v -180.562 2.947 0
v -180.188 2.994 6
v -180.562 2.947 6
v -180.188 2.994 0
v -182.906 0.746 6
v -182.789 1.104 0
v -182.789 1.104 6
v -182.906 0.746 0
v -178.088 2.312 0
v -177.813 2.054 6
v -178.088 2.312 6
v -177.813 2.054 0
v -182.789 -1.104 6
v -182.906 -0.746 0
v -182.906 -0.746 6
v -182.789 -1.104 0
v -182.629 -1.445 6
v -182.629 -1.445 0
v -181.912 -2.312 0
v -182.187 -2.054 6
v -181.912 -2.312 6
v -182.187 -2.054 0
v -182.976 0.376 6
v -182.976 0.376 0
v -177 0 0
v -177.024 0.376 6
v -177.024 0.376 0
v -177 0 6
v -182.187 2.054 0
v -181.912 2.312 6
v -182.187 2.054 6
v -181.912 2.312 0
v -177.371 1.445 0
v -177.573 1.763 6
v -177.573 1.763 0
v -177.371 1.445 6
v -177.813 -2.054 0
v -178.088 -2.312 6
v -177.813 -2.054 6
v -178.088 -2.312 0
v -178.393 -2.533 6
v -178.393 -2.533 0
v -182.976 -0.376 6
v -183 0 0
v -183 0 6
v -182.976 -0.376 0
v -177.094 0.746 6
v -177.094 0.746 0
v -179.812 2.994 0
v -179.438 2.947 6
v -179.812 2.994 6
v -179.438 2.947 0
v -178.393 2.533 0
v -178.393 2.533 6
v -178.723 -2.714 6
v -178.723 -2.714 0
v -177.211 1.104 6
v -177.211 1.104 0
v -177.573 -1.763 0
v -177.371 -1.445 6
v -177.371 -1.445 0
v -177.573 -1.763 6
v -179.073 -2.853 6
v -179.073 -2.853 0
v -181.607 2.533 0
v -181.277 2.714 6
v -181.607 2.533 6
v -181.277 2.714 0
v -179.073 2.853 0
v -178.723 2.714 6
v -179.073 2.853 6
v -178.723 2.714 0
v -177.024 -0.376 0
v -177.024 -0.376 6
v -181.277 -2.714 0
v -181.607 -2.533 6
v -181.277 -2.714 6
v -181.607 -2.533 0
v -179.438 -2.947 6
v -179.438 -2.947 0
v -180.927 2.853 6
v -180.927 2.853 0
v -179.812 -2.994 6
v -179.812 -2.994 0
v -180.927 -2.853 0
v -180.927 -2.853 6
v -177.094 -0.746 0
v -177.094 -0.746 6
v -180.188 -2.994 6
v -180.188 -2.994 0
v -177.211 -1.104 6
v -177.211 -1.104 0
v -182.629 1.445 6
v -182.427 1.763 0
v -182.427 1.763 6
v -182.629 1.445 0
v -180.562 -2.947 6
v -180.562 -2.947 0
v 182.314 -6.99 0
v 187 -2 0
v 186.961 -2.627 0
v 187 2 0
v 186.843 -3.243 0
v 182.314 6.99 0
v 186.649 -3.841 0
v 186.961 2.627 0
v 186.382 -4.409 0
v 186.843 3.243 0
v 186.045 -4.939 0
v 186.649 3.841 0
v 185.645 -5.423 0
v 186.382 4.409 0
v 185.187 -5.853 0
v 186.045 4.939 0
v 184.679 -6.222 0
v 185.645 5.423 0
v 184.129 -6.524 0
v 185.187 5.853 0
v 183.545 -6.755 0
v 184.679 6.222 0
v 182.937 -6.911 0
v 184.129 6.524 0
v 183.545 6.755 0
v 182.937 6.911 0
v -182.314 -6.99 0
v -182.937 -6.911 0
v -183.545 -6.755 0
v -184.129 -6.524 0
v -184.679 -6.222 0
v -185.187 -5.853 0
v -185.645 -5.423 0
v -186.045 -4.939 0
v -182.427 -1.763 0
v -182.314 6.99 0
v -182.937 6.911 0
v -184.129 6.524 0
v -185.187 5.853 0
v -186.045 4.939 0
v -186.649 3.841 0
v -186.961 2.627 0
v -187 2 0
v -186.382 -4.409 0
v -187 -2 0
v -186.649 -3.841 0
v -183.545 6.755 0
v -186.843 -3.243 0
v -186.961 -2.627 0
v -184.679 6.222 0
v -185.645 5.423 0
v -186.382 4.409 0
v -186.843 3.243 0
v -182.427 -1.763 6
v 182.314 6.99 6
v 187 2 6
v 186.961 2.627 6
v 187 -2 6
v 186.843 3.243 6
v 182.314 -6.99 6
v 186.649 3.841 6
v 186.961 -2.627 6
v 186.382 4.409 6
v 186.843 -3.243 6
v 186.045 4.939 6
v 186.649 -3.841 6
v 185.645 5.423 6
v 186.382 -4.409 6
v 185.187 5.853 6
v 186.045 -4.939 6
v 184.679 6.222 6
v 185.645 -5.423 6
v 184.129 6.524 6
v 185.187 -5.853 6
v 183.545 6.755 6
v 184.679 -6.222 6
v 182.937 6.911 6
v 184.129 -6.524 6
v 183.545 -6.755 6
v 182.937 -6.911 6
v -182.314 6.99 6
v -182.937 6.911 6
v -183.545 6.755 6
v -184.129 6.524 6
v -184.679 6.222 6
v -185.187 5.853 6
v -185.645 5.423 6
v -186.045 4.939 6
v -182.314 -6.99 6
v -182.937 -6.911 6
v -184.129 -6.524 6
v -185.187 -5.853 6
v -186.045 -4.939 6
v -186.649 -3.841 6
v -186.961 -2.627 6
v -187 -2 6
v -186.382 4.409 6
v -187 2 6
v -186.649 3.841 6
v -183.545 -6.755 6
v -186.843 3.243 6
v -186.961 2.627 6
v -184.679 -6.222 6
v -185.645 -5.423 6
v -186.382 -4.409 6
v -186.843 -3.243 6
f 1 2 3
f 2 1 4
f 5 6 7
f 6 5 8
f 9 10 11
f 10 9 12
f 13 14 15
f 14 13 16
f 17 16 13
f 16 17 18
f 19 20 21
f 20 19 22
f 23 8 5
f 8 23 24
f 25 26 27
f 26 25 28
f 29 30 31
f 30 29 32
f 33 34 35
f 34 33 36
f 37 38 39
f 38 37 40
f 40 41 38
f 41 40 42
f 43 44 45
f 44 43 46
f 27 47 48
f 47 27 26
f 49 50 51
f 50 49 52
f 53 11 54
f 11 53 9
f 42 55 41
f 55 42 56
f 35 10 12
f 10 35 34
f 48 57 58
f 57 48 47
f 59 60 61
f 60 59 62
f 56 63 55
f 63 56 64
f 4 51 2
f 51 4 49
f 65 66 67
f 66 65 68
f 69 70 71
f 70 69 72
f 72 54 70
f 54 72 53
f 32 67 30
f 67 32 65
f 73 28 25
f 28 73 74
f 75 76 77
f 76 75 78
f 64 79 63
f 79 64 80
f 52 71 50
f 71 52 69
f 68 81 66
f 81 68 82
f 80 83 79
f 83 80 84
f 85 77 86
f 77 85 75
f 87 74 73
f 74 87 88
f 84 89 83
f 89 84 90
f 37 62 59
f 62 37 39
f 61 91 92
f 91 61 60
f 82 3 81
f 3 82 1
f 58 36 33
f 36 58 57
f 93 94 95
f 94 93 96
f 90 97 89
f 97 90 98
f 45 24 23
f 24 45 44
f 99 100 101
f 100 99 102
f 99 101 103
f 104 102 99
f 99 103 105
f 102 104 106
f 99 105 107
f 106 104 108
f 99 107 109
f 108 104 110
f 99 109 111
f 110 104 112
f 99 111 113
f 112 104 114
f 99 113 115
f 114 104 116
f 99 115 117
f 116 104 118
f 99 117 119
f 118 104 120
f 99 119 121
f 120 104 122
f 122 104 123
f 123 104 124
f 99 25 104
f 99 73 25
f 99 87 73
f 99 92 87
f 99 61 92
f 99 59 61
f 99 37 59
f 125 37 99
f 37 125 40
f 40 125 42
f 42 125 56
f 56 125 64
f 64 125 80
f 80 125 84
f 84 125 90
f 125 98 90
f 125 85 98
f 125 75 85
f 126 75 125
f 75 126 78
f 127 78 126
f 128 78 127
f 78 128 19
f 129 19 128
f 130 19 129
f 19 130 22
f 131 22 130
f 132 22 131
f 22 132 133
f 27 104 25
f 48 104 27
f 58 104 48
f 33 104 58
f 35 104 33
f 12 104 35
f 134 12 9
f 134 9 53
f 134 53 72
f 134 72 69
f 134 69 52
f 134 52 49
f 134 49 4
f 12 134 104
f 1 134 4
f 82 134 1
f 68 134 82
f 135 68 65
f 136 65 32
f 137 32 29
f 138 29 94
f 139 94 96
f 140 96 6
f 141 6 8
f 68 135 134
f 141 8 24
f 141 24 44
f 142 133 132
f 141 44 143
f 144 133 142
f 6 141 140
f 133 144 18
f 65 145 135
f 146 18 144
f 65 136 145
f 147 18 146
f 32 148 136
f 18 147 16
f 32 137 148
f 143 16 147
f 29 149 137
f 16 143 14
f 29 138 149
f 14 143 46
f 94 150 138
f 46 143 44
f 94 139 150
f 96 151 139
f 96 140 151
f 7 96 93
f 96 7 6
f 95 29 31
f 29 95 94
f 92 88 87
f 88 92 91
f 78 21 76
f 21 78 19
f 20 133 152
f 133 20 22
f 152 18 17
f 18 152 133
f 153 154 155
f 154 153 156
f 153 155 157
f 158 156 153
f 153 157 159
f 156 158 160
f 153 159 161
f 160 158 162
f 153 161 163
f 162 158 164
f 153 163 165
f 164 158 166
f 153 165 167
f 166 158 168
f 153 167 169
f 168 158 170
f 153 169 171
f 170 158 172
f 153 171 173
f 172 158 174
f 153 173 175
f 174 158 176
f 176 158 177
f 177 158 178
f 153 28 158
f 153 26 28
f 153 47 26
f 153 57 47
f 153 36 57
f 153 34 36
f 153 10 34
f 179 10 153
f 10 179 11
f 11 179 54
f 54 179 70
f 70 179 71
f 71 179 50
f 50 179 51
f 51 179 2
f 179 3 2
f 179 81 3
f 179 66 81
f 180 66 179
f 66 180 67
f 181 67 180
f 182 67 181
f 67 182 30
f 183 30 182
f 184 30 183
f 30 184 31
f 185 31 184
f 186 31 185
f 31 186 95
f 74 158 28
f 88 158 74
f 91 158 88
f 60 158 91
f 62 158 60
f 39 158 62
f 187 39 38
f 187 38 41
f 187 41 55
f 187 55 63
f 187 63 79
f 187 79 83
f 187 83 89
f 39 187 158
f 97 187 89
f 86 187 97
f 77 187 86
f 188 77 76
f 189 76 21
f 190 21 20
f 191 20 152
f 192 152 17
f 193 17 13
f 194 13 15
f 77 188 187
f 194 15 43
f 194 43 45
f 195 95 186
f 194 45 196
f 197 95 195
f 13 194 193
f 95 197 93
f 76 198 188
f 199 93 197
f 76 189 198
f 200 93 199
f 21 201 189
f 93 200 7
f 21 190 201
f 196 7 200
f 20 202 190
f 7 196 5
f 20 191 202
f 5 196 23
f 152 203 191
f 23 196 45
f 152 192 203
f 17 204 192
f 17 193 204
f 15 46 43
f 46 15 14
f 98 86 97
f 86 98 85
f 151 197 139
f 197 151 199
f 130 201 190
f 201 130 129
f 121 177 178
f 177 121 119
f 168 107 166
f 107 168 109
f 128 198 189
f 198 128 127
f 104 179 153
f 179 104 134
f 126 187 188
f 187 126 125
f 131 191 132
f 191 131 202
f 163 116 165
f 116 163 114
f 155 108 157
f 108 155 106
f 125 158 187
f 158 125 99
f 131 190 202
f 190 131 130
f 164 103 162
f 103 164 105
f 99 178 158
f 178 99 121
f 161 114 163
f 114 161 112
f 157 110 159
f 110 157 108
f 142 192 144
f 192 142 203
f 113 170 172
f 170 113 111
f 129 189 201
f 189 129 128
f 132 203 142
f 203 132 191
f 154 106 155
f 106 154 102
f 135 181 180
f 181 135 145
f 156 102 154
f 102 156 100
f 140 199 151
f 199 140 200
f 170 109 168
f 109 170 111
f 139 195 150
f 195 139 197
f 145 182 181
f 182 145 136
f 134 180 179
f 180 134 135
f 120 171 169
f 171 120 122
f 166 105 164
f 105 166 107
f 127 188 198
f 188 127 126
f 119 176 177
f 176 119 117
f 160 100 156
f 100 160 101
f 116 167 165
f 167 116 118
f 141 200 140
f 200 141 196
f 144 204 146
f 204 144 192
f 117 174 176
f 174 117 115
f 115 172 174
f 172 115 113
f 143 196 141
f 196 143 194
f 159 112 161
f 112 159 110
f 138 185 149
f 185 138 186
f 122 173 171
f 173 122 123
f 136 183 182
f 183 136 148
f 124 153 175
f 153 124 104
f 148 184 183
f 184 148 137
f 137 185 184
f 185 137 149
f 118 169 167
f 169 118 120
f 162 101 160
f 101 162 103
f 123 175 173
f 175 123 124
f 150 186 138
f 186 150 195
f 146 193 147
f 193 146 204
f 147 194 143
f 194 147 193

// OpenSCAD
$fn = 50;


difference() {
	union() {
		hull() {
			translate(v = [-182.0000000000, 2.0000000000, 0]) {
				cylinder(h = 6, r = 5);
			}
			translate(v = [182.0000000000, 2.0000000000, 0]) {
				cylinder(h = 6, r = 5);
			}
			translate(v = [-182.0000000000, -2.0000000000, 0]) {
				cylinder(h = 6, r = 5);
			}
			translate(v = [182.0000000000, -2.0000000000, 0]) {
				cylinder(h = 6, r = 5);
			}
		}
	}
	union() {
		translate(v = [-180.0000000000, 0.0000000000, 0]) {
			cylinder(h = 6, r = 3.0000000000);
		}
		translate(v = [-180.0000000000, 0.0000000000, 0]) {
			cylinder(h = 6, r = 1.5000000000);
		}
		translate(v = [-180.0000000000, 0.0000000000, 0]) {
			cylinder(h = 6, r = 1.5000000000);
		}
		translate(v = [-180.0000000000, 0.0000000000, 0]) {
			cylinder(h = 6, r = 1.5000000000);
		}
	}
}
